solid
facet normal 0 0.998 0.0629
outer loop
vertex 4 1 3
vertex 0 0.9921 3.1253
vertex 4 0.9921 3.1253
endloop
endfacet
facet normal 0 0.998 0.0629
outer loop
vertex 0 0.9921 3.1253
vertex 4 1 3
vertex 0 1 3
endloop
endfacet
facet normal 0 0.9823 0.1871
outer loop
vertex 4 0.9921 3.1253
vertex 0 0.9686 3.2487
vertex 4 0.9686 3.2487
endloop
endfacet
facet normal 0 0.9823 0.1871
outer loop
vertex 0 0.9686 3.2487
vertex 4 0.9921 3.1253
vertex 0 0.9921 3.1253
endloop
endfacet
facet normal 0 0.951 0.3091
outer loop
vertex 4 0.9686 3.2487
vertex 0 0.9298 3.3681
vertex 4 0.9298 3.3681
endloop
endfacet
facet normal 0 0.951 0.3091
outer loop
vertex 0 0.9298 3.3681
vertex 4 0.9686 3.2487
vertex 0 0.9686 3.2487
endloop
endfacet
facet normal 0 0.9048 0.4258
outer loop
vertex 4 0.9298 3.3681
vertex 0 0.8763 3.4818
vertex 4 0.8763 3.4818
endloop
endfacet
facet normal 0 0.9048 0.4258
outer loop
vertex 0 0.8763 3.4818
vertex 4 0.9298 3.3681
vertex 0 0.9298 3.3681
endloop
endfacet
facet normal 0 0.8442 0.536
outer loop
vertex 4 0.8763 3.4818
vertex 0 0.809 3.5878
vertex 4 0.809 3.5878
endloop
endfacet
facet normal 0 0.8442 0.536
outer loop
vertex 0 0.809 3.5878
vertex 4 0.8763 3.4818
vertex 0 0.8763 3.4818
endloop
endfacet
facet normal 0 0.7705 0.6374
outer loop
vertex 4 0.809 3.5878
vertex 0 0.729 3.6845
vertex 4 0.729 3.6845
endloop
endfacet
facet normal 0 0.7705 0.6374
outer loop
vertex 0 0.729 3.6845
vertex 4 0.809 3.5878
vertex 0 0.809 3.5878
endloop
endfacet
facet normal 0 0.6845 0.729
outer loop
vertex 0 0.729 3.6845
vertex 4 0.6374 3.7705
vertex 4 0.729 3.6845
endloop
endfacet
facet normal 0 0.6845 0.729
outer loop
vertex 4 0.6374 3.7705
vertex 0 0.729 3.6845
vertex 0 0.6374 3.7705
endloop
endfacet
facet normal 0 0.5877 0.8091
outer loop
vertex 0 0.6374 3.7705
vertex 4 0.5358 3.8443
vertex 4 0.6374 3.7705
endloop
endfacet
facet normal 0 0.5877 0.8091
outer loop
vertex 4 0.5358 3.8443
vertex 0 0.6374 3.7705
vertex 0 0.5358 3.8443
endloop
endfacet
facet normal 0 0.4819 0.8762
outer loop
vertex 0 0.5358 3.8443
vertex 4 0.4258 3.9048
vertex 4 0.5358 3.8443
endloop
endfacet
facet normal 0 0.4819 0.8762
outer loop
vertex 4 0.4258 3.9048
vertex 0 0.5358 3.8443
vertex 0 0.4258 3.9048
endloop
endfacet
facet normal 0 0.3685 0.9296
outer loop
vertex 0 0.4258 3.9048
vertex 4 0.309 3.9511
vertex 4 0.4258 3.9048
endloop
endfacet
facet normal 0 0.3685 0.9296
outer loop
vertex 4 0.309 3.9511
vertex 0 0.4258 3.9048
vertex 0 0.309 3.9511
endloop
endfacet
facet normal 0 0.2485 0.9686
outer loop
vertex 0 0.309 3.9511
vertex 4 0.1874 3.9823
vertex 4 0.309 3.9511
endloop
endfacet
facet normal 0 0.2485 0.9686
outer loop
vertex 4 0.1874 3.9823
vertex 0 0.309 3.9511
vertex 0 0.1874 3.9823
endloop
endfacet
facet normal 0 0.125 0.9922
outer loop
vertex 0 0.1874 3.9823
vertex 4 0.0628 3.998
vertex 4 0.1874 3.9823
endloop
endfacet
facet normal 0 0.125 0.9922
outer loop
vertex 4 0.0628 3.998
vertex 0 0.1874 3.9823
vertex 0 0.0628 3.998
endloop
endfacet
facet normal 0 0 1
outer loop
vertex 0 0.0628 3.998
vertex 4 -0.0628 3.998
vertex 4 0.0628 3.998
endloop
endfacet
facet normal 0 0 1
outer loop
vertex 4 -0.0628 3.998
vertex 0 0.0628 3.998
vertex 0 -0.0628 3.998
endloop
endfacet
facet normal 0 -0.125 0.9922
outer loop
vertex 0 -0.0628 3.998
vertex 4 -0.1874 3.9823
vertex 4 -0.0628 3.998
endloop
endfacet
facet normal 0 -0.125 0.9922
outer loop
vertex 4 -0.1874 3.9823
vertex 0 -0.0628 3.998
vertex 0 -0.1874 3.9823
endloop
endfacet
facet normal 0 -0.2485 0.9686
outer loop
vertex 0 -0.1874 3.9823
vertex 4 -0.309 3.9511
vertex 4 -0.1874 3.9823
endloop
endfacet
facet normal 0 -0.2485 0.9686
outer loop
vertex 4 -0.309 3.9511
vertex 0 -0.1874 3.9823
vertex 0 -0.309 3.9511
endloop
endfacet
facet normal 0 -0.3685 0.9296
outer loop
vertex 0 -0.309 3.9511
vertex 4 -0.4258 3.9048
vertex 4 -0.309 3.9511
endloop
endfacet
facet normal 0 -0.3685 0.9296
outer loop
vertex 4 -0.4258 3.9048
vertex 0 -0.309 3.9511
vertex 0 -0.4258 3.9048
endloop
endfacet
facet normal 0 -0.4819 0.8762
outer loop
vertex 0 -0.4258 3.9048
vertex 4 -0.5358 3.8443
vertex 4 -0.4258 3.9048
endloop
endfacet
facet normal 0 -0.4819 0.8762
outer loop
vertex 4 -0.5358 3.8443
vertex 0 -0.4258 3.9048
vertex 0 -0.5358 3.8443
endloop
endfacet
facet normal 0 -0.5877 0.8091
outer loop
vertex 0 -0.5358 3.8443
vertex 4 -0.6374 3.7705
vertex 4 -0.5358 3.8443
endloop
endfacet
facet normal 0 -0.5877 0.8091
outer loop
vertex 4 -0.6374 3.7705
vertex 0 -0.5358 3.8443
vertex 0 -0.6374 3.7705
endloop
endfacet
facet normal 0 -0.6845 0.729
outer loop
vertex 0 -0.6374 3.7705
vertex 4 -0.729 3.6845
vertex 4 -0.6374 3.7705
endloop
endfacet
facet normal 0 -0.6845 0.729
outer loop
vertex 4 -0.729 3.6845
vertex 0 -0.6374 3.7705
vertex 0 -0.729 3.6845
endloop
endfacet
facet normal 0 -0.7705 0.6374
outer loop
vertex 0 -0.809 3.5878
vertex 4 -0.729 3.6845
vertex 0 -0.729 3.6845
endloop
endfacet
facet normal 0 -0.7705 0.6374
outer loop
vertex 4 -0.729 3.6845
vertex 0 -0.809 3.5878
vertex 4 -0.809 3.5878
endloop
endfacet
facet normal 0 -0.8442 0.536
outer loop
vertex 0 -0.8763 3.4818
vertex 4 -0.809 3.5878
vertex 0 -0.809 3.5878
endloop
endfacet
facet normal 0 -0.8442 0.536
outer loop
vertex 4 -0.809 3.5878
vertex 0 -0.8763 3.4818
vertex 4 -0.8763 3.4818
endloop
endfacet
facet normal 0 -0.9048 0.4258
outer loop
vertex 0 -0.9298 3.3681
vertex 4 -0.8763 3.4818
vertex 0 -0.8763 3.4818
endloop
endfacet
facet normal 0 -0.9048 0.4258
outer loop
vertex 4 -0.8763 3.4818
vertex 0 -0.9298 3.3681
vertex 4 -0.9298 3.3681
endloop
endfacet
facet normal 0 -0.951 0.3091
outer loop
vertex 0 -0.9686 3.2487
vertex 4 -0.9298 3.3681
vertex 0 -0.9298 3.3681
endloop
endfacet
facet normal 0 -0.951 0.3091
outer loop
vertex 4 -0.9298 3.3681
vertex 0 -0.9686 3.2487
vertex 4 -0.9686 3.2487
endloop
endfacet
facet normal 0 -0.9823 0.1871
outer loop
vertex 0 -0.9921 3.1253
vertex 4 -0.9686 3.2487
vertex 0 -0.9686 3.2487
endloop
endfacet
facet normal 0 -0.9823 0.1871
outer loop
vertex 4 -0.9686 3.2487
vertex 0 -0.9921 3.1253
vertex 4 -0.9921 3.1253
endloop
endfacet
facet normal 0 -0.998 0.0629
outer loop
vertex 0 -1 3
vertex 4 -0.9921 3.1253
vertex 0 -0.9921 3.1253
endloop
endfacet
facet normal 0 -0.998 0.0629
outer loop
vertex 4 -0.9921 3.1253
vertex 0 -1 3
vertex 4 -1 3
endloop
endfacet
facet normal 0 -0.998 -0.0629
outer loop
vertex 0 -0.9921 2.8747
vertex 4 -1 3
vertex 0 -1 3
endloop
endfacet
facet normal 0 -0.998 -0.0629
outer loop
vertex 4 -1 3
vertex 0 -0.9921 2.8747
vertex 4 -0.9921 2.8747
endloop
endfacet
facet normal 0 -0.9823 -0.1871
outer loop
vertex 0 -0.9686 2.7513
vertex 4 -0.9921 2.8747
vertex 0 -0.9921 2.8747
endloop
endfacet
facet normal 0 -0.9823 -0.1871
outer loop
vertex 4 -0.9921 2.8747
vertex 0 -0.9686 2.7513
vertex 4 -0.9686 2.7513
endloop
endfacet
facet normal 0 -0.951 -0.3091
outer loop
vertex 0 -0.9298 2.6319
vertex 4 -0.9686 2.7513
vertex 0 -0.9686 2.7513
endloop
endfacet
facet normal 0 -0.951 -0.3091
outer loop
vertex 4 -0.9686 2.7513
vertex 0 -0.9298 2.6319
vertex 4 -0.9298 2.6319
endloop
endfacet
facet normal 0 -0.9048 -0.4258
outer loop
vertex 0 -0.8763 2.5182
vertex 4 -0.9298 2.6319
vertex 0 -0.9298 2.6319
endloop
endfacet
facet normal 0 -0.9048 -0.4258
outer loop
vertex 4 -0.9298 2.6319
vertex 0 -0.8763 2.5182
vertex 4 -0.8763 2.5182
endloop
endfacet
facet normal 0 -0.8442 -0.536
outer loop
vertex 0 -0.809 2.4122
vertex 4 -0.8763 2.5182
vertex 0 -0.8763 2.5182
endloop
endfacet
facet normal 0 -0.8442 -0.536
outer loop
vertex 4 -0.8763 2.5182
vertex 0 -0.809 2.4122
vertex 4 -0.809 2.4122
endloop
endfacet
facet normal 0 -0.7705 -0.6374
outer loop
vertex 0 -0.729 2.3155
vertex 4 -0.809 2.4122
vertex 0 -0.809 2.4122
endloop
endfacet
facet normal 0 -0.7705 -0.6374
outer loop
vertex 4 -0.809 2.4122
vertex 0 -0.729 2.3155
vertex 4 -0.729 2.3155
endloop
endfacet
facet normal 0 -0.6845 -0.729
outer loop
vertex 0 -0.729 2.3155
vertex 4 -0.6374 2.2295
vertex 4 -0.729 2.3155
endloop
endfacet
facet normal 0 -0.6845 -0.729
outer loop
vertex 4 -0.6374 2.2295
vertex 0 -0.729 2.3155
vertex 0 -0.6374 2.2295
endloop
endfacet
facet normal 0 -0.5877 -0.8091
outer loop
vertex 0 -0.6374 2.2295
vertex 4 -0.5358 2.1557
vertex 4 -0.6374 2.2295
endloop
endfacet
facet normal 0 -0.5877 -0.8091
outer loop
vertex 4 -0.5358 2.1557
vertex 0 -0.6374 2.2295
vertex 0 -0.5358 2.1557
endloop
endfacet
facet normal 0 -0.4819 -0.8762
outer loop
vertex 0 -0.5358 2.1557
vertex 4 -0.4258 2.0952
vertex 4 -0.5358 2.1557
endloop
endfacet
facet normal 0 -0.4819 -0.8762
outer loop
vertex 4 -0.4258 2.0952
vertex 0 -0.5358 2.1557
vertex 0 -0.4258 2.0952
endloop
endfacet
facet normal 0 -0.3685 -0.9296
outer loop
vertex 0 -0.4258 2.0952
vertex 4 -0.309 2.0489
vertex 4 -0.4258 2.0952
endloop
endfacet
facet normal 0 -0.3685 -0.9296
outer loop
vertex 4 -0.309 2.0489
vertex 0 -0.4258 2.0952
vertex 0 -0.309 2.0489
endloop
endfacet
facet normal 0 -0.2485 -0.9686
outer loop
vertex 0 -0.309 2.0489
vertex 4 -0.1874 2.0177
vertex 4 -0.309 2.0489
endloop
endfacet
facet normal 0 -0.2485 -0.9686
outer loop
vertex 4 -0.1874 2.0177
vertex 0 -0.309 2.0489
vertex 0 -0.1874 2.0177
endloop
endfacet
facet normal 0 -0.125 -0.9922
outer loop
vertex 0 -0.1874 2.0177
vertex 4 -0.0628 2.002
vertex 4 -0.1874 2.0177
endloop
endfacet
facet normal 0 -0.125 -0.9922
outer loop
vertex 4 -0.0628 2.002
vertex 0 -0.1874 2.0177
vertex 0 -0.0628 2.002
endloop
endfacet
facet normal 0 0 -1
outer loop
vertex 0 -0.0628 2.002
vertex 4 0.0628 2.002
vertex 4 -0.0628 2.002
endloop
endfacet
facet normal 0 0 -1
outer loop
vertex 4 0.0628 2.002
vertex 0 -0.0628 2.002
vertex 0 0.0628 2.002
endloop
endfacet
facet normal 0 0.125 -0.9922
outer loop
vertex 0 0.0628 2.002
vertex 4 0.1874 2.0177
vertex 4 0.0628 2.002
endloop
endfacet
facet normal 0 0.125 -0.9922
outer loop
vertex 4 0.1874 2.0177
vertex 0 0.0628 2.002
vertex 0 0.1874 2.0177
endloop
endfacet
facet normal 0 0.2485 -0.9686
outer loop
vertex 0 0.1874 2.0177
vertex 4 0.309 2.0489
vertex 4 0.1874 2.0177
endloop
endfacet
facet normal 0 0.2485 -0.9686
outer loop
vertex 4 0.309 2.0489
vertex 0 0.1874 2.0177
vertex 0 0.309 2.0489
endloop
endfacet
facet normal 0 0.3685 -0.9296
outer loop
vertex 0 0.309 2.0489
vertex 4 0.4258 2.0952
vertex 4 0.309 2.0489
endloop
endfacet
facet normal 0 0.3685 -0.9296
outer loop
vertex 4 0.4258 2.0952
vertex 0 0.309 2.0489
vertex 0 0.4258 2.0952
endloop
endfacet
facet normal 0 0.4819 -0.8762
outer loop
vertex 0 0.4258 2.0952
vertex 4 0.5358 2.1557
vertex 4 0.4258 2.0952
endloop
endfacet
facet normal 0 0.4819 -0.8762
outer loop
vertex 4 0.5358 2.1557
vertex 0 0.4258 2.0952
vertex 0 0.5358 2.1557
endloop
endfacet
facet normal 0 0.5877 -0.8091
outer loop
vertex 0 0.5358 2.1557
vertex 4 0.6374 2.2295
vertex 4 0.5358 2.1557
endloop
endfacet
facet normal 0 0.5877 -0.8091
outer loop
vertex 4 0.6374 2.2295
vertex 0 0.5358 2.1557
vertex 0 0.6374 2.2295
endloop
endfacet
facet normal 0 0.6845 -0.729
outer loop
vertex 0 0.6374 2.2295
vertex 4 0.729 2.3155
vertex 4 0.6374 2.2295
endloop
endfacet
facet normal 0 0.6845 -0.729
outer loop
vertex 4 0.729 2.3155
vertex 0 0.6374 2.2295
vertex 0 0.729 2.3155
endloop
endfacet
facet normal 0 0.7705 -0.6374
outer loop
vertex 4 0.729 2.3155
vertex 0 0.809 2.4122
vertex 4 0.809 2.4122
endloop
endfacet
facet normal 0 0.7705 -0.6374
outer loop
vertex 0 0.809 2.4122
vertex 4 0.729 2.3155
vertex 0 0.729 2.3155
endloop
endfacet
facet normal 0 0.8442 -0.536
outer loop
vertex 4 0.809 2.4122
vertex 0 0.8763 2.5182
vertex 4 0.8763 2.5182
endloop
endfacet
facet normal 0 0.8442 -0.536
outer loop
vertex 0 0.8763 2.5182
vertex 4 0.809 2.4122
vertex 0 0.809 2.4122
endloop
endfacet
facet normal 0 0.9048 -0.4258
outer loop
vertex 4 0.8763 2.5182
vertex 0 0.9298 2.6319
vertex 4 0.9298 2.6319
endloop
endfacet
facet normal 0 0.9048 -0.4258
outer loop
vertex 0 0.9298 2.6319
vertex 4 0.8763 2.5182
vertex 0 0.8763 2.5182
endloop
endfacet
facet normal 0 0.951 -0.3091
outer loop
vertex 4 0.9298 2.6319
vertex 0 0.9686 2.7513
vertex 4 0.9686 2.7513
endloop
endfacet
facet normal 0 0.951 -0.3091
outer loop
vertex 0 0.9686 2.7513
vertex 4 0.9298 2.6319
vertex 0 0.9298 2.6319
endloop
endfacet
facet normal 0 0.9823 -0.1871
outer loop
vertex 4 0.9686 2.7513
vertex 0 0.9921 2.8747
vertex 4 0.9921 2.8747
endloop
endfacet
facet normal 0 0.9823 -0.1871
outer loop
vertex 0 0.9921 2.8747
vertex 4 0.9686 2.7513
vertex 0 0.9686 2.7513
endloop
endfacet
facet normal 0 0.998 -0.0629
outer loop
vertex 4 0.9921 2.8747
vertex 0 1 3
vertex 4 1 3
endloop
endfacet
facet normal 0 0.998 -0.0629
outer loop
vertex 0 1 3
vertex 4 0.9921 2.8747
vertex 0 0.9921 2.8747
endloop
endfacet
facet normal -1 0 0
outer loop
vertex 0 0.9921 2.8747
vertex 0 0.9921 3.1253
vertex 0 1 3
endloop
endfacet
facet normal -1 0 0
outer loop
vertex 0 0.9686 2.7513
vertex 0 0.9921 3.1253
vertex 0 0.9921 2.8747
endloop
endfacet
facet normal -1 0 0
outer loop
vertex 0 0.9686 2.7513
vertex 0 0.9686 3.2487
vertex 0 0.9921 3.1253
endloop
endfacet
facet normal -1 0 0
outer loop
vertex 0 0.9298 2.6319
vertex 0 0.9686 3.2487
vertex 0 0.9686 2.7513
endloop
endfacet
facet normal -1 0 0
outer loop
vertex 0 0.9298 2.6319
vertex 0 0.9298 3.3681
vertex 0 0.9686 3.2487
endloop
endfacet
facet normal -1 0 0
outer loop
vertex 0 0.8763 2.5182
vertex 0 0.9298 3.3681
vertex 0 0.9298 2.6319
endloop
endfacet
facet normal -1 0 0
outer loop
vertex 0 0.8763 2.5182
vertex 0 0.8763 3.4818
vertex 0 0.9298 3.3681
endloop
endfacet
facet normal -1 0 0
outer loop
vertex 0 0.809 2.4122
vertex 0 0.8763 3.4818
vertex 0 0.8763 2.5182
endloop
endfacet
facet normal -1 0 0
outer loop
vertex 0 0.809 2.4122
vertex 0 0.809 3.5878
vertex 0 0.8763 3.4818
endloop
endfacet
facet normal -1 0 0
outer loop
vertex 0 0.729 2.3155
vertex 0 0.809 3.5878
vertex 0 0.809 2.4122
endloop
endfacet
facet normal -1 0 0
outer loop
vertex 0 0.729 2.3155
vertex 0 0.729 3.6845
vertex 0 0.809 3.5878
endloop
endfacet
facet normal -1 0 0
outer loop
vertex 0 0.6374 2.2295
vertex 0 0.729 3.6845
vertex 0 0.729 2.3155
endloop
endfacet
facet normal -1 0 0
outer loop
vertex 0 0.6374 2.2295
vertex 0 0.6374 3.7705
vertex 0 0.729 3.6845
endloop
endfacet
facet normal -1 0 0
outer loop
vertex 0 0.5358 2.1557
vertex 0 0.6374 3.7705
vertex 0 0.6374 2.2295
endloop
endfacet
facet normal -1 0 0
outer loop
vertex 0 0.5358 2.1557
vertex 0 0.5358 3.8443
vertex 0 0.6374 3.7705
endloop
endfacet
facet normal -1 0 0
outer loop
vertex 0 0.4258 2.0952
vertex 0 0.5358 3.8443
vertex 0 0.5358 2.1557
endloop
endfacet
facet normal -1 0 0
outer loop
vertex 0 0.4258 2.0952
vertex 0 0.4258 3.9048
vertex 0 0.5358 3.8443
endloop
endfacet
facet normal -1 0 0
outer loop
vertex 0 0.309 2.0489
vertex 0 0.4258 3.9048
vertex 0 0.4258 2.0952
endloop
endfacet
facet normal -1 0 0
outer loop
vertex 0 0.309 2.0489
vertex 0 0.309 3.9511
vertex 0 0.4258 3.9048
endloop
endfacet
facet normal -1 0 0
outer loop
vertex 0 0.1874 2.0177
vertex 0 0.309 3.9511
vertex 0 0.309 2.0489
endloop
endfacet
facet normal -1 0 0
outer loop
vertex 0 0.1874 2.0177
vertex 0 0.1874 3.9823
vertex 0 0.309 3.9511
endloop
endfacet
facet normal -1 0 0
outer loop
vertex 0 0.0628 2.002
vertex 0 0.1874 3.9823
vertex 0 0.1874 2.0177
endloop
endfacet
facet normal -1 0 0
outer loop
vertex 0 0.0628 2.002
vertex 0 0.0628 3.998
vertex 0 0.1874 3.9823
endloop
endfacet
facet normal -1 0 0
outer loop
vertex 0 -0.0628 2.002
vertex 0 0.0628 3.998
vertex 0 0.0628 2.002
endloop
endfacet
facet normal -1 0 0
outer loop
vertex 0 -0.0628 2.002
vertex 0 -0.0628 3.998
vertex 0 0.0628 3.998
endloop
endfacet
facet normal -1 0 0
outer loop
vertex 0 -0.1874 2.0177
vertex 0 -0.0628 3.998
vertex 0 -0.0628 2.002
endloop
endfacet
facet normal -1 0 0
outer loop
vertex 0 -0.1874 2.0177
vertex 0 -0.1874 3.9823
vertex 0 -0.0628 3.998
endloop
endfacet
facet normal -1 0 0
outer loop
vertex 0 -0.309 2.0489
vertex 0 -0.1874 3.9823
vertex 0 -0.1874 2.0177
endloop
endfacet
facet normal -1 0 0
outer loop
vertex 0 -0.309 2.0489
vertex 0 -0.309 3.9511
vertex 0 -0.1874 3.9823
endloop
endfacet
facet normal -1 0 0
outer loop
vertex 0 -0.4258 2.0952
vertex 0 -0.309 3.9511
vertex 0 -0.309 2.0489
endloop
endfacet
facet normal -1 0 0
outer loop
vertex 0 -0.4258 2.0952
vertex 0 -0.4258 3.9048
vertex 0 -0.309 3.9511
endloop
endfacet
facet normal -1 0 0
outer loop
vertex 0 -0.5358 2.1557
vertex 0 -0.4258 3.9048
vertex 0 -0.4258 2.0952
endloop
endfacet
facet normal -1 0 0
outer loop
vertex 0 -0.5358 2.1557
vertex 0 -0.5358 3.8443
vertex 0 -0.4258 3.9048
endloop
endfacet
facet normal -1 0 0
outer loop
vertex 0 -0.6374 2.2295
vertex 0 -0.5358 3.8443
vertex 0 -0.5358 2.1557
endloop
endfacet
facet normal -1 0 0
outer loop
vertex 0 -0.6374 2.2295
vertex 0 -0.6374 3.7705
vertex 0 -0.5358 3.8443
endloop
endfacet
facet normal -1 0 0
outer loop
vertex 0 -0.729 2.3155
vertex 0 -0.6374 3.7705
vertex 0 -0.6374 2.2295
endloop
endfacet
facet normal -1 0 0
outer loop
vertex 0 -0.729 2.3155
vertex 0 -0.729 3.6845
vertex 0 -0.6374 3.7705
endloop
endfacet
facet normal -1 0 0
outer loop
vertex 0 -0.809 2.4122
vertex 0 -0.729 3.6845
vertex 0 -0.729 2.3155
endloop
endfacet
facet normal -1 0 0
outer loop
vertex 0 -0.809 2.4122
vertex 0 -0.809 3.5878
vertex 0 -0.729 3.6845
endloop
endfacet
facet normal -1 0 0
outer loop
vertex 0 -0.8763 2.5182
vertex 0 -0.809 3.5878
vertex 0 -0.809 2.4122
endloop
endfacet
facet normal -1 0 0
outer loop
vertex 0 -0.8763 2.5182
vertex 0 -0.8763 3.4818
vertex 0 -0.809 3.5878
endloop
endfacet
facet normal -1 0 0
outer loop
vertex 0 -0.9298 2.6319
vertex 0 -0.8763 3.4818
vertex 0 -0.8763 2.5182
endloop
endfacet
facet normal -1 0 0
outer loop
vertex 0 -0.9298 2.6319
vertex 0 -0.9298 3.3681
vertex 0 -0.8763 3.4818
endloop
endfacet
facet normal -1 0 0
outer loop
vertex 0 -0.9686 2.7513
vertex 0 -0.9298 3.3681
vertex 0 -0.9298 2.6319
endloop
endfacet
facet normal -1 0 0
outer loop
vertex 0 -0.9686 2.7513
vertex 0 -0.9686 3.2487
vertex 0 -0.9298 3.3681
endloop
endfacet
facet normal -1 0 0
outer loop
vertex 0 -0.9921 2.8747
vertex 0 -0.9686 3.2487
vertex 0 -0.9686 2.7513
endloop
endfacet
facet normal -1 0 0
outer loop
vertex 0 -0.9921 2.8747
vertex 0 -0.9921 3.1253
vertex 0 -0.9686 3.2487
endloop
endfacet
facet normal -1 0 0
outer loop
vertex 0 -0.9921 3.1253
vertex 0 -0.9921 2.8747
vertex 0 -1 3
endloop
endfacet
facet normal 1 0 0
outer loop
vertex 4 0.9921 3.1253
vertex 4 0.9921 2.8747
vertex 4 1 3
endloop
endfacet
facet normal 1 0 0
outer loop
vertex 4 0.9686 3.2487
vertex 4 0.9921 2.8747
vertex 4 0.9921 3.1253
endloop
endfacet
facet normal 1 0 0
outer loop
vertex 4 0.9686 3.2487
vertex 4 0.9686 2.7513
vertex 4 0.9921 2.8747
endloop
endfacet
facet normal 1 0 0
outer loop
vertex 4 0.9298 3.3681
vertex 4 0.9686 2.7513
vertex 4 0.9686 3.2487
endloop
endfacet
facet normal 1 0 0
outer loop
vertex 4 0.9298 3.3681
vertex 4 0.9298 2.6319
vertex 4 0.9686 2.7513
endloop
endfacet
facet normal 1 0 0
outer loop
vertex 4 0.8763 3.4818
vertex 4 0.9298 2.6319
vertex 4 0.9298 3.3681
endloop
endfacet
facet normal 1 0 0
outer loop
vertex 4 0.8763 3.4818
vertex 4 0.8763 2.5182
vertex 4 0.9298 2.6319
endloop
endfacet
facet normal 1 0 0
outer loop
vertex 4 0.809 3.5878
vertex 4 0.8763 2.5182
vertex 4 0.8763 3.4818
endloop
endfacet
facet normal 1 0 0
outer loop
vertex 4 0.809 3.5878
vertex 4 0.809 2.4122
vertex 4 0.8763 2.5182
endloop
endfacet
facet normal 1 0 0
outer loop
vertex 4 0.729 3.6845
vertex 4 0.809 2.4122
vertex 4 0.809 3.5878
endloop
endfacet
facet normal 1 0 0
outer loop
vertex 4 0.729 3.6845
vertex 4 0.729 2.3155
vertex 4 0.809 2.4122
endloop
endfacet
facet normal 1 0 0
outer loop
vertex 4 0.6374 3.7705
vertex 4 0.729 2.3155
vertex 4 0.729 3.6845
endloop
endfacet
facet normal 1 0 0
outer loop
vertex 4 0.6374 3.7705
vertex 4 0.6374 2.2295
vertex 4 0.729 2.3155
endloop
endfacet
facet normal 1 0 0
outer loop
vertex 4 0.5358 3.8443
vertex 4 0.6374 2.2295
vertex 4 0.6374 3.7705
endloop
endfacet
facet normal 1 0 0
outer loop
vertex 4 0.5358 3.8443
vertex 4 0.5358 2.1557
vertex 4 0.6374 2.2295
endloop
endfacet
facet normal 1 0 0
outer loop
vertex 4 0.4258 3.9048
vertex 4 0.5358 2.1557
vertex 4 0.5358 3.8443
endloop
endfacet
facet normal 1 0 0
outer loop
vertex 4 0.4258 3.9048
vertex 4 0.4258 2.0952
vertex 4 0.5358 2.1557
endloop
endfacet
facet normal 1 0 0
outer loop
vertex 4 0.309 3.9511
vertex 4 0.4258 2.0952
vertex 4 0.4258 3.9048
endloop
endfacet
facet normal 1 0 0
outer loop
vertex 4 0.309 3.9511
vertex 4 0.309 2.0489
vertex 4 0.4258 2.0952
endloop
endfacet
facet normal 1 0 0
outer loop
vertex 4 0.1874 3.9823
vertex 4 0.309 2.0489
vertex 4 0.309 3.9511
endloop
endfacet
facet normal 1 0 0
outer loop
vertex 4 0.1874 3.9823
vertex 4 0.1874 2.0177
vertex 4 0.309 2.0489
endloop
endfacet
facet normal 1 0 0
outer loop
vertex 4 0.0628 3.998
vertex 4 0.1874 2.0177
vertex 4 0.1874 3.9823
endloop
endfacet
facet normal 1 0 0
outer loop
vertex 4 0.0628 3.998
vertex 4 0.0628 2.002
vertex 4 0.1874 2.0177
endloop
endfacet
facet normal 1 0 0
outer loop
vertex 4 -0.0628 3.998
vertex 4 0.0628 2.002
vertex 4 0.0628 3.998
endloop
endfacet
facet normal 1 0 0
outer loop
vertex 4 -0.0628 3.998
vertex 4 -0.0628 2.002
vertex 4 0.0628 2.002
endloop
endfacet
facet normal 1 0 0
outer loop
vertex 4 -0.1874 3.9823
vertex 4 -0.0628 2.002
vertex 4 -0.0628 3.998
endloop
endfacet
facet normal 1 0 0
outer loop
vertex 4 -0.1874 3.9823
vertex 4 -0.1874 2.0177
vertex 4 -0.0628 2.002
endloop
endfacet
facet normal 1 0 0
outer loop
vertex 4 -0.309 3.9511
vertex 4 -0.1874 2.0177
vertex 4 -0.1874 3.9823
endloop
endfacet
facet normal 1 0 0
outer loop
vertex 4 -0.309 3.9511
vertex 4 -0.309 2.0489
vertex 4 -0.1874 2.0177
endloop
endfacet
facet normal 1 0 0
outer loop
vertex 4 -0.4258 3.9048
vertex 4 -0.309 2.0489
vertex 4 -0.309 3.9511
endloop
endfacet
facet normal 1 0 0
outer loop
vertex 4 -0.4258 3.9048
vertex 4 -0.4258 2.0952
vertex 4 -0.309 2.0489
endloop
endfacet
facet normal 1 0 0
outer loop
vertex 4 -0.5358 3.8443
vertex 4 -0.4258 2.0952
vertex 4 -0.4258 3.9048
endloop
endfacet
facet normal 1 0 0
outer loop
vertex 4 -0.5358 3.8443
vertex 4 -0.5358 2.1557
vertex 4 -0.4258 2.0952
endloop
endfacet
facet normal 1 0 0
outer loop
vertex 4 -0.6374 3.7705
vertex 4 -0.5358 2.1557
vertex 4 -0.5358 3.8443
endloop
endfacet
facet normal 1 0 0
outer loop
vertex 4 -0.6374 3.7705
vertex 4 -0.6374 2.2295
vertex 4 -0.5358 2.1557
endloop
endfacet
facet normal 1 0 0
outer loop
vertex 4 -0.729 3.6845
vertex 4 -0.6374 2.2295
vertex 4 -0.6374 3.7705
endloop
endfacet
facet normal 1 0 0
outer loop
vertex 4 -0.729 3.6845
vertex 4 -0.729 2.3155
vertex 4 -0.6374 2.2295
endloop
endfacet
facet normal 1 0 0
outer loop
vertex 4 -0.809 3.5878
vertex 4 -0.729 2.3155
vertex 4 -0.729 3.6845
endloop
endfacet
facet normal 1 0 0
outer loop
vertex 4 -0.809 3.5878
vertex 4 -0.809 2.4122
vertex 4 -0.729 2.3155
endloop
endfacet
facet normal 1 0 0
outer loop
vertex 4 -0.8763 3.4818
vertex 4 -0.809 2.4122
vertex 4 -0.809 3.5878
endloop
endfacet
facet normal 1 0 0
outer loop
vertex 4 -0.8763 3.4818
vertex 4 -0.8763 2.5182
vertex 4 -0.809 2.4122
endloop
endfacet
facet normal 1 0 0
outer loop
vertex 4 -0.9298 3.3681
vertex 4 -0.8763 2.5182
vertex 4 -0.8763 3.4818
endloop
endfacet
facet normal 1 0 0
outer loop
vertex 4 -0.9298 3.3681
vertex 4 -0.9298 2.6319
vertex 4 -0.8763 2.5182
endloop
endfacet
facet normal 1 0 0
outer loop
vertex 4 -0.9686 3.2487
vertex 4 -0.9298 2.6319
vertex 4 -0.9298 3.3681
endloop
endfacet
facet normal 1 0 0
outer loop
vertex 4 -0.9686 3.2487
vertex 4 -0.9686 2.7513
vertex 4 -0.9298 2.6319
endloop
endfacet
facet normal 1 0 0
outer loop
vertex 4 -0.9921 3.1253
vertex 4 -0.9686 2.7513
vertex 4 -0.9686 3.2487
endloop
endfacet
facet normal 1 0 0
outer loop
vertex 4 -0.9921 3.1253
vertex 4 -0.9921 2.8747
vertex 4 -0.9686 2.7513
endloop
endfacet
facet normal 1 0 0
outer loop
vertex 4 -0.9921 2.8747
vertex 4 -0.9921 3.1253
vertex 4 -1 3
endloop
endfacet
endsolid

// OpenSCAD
$fn=50;
%cylinder(h=30, r=2);

translate([0,0,3])
rotate([90, 0, 90]){
cylinder(h=4, r=1);
square([3,1], center=true);
}
